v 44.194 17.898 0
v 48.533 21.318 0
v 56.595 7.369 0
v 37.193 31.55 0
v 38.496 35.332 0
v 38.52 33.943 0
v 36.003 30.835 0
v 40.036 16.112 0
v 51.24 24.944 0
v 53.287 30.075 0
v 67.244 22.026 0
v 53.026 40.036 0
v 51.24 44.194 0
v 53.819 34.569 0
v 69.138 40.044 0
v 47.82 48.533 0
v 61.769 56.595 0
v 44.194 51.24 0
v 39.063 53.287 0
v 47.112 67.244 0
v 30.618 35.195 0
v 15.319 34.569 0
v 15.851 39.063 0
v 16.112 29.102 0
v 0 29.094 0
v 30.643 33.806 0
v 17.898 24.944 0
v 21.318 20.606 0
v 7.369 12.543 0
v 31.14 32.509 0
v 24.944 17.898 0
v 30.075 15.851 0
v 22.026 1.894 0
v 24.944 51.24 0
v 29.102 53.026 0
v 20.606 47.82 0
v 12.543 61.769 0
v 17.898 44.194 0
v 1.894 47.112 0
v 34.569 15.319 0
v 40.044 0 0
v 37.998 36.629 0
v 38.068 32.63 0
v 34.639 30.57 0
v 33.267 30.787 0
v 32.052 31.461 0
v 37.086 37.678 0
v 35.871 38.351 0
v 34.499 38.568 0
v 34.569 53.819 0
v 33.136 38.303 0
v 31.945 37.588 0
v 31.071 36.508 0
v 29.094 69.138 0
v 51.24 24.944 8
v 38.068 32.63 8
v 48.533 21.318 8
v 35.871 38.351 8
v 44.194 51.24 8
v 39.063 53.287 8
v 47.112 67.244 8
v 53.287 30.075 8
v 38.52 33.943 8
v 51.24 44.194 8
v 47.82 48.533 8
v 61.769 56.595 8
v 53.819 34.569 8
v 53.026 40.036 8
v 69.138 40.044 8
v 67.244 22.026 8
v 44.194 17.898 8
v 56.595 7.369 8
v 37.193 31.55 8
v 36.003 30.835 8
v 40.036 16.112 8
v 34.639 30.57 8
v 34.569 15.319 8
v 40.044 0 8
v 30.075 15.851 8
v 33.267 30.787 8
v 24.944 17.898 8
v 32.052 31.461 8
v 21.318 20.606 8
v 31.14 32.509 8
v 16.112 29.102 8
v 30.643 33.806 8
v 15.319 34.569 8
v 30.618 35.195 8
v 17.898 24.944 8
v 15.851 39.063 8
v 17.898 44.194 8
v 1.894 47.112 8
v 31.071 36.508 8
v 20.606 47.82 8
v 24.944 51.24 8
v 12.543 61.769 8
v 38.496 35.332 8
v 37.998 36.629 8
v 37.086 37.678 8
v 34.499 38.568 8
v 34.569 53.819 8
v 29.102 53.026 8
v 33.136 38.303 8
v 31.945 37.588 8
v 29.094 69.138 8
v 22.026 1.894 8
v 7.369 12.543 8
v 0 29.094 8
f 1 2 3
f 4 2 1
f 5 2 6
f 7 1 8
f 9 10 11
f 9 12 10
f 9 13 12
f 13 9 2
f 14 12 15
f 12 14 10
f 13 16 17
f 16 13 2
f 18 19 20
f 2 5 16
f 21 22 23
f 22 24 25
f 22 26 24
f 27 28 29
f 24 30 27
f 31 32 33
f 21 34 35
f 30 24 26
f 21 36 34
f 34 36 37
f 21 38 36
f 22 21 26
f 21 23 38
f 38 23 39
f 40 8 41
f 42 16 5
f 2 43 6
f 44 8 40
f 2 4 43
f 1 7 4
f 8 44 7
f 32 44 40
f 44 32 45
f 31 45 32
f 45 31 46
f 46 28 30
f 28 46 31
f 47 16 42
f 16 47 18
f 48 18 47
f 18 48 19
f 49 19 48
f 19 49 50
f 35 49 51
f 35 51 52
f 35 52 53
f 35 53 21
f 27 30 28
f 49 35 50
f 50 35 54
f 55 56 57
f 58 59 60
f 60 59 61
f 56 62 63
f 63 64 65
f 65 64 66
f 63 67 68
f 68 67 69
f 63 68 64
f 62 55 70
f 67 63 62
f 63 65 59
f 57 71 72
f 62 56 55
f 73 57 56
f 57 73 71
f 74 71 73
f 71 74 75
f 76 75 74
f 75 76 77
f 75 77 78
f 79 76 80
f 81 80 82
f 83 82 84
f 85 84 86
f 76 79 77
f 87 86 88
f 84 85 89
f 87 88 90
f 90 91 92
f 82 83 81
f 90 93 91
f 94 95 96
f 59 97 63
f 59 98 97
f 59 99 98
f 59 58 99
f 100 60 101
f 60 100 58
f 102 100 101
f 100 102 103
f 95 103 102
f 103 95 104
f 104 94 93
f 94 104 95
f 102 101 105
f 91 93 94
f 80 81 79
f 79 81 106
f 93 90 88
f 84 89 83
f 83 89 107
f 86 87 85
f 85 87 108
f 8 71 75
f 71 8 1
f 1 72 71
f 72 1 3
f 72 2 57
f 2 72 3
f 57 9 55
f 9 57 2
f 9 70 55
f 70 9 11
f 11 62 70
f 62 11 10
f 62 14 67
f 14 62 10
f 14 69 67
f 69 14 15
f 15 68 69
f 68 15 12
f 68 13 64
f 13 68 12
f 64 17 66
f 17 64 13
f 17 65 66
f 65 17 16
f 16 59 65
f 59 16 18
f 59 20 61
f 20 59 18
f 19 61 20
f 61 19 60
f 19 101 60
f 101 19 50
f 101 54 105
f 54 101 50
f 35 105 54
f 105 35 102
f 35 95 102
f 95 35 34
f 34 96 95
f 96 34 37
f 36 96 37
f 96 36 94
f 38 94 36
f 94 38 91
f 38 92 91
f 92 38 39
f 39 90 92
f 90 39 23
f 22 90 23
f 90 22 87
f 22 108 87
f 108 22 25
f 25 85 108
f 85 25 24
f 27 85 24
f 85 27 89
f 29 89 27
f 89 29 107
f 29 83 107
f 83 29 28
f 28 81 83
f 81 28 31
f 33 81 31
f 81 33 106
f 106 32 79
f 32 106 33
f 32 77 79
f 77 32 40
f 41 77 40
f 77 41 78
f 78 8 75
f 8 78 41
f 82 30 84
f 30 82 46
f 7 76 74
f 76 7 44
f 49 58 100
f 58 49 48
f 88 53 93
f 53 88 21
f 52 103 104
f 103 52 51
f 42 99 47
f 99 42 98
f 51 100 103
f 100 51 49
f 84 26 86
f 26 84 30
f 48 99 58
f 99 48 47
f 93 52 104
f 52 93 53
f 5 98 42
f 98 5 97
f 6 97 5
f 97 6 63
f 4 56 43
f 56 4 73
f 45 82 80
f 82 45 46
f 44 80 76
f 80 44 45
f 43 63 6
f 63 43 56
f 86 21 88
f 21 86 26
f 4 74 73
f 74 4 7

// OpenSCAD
$fn = 32;

// ----------------------------------------------------------------------
// Star wheel: 12-point ratchet, R35
// ----------------------------------------------------------------------

// --- parameters (mm) ---
n_points = 12;            // number of points / teeth
r_out = 35;               // tip radius
r_in = 19.25;             // root radius
bore_r = 4;               // centre bore radius
plate_t = 8;              // plate thickness, Z (extrusion height)
bore_d = 8;               // centre bore diameter
fit_tol = 0.1;            // declared fit tolerance (prompt contract)
free_tol = 0.3;           // declared free tolerance (prompt contract)

profile = [[53.819, 34.569], [69.138, 40.044], [53.026, 40.036], [51.24, 44.194], [61.769, 56.595], [47.82, 48.533], [44.194, 51.24], [47.112, 67.244], [39.063, 53.287], [34.569, 53.819], [29.094, 69.138], [29.102, 53.026], [24.944, 51.24], [12.543, 61.769], [20.606, 47.82], [17.898, 44.194], [1.894, 47.112], [15.851, 39.063], [15.319, 34.569], [0, 29.094], [16.112, 29.102], [17.898, 24.944], [7.369, 12.543], [21.318, 20.606], [24.944, 17.898], [22.026, 1.894], [30.075, 15.851], [34.569, 15.319], [40.044, 0], [40.036, 16.112], [44.194, 17.898], [56.595, 7.369], [48.533, 21.318], [51.24, 24.944], [67.244, 22.026], [53.287, 30.075]];  // primary outline, 36 points, counter clockwise
void_1 = [[38.496, 35.332], [37.998, 36.629], [37.086, 37.678], [35.871, 38.351], [34.499, 38.568], [33.136, 38.303], [31.945, 37.588], [31.071, 36.508], [30.618, 35.195], [30.643, 33.806], [31.14, 32.509], [32.052, 31.461], [33.267, 30.787], [34.639, 30.57], [36.003, 30.835], [37.193, 31.55], [38.068, 32.63], [38.52, 33.943]];  // centre bore, 18 points

// --- the one profile operation ---
difference() {
  linear_extrude(height = plate_t) polygon(points = profile);
  translate([0, 0, -1])
    linear_extrude(height = plate_t + 2) polygon(points = void_1);
}
